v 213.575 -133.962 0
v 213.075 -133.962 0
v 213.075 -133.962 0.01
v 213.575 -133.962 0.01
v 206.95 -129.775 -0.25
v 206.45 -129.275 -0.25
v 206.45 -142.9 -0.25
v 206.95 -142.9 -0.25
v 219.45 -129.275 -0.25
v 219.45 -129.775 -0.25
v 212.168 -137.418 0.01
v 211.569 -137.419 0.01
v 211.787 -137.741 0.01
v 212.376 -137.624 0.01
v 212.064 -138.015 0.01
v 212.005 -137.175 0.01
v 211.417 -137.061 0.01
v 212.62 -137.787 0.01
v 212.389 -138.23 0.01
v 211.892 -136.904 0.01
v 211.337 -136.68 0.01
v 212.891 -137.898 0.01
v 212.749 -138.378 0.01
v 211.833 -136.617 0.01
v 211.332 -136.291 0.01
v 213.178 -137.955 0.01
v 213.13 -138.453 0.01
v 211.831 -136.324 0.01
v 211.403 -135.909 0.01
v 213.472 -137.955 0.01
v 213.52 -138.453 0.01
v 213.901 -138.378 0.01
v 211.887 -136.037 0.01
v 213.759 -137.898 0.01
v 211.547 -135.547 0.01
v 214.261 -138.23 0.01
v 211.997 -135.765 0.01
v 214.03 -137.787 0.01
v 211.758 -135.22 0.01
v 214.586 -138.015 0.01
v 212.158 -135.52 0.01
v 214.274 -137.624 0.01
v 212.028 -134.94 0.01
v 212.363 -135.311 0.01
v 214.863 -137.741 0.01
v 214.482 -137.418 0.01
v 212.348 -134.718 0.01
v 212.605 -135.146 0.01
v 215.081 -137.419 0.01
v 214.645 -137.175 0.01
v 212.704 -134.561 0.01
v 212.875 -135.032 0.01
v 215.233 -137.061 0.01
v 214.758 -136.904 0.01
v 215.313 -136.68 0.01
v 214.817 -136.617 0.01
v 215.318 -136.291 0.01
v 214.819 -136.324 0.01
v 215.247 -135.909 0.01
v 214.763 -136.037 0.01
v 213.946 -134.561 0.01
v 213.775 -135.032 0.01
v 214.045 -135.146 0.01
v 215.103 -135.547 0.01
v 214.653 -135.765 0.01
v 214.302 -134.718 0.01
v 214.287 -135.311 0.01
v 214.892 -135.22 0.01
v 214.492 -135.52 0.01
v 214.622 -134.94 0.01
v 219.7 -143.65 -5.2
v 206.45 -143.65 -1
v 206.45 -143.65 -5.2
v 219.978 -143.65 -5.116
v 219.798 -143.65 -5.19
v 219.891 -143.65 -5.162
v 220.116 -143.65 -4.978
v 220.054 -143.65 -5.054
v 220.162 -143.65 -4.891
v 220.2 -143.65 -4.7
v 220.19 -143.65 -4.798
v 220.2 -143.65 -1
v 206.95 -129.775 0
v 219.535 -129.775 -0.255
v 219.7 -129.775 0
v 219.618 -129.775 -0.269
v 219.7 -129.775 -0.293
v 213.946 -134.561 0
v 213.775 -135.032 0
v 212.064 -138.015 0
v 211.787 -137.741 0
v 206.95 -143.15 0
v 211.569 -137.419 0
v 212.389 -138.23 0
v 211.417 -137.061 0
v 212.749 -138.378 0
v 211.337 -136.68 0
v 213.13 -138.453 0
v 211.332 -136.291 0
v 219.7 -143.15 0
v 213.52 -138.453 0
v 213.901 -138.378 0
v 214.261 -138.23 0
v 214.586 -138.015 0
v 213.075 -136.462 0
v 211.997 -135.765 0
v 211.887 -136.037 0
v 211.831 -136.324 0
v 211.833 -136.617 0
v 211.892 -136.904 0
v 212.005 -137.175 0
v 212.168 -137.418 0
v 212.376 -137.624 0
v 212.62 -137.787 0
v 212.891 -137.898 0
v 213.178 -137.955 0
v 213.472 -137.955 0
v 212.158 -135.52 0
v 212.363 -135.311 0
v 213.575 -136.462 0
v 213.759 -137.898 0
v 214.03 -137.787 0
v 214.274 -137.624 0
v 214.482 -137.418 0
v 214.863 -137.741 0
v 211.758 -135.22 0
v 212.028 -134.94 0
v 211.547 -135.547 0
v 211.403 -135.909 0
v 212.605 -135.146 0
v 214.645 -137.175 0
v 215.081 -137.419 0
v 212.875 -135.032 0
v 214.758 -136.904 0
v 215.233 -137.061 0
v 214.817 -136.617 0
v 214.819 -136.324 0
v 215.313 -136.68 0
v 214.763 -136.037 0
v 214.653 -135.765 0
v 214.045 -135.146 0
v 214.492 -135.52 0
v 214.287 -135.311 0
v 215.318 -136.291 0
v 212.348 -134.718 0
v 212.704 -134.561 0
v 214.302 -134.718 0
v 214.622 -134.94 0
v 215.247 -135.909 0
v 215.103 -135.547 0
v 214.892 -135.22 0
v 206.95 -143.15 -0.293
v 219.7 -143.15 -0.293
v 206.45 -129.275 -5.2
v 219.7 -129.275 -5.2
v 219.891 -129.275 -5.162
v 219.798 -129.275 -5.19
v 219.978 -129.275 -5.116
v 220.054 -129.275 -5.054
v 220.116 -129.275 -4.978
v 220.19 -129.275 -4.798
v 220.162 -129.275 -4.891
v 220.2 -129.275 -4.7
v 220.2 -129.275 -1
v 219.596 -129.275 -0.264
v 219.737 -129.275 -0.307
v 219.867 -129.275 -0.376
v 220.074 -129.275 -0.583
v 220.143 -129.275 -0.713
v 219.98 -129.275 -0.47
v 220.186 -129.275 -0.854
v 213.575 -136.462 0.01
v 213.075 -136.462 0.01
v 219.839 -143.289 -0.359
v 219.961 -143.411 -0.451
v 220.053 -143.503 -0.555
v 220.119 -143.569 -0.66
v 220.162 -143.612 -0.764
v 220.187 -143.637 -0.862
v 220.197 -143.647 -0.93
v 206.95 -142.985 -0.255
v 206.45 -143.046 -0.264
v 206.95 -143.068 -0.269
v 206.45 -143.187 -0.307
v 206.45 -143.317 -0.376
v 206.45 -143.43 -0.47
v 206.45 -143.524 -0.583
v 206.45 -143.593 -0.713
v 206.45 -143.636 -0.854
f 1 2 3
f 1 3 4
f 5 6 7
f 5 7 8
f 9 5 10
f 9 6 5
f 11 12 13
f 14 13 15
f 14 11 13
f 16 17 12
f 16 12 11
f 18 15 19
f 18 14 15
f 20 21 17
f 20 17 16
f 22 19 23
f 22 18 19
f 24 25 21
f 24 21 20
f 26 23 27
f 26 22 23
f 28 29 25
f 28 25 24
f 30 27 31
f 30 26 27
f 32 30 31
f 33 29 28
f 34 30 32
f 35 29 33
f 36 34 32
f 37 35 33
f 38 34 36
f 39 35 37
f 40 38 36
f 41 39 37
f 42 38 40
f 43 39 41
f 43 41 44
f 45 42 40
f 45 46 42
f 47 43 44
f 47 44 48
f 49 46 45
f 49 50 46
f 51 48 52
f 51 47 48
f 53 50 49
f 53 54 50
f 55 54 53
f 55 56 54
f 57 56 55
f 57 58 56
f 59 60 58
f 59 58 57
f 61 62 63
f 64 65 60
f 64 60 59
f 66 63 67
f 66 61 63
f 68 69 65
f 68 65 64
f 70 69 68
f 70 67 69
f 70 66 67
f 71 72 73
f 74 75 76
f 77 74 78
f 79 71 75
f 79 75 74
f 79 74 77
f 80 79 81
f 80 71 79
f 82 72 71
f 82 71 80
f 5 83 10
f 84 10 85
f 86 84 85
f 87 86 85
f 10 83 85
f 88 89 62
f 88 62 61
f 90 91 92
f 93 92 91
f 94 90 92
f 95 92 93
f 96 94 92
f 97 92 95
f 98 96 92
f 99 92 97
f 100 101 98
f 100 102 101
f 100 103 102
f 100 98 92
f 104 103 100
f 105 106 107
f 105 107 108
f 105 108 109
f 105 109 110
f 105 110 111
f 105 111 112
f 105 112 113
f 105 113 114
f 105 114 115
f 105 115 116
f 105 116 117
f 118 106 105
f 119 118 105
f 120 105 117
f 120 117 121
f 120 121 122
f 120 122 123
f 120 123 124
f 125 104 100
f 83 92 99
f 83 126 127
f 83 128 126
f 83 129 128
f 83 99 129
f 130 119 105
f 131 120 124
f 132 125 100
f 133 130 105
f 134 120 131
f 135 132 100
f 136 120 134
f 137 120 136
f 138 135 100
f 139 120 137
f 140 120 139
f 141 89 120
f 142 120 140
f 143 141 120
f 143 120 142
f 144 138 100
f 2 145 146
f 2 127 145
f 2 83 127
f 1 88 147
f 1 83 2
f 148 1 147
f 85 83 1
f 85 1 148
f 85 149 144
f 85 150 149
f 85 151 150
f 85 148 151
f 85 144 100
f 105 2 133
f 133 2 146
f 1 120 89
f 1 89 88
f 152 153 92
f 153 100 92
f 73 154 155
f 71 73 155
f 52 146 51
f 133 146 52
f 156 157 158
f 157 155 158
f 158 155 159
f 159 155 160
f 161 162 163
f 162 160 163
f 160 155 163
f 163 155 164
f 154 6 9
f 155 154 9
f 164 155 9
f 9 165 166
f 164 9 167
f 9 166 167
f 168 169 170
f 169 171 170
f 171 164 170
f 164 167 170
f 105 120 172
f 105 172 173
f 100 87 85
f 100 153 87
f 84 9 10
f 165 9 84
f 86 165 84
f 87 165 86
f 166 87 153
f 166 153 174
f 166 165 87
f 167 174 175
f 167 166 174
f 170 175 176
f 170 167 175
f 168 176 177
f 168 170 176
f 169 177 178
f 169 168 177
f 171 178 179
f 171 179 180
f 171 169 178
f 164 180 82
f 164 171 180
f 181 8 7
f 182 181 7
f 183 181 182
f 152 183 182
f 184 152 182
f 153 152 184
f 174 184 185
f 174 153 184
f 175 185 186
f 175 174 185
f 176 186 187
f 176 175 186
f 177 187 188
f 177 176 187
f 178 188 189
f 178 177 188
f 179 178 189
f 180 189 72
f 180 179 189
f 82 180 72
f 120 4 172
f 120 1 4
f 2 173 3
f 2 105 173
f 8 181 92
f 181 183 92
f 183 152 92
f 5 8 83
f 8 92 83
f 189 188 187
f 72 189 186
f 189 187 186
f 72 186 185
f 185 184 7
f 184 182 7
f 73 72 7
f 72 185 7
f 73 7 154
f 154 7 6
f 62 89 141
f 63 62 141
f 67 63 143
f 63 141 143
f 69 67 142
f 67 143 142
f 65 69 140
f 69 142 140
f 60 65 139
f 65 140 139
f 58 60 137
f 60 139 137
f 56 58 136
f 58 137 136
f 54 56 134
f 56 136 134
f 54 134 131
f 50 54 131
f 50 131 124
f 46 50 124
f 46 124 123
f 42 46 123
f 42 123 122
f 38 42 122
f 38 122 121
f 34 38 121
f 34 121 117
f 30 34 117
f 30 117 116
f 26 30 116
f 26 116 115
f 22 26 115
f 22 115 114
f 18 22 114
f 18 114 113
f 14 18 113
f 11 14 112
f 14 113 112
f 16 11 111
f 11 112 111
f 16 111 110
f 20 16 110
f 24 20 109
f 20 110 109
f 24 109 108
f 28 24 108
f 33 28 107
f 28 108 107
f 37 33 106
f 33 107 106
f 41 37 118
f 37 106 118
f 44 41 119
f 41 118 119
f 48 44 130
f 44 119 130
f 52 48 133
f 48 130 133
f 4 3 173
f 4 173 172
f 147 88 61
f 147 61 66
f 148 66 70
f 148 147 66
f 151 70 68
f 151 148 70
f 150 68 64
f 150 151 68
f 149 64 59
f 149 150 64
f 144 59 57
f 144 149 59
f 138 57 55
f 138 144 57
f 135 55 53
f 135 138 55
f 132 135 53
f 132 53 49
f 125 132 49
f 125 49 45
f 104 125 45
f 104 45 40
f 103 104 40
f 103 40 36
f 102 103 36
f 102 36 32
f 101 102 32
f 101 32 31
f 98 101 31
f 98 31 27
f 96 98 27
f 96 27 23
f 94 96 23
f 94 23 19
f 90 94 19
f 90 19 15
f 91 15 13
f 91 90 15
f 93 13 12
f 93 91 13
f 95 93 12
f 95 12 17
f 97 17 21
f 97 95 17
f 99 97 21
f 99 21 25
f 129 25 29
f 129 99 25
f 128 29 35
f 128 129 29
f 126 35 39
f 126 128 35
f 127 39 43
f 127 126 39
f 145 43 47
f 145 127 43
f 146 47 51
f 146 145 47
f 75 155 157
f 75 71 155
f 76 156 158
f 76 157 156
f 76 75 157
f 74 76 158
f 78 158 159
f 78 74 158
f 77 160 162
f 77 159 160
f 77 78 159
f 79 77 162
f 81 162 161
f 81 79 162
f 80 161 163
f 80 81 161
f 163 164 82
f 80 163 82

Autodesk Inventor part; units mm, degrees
ref_plane "YZ Plane" through (0, 0, 0) normal (1, 0, 0) x (0, 1, 0)
ref_plane "XZ Plane" through (0, 0, 0) normal (0, 1, 0) x (-1, 0, 0)
ref_plane "XY Plane" through (0, 0, 0) normal (0, 0, 1) x (1, 0, 0)
sketch "Szkic1" plane through (0, 0, 0) normal (0, 0, 1) x (1, 0, 0)
  line L0 (206.45, -143.65) -> (206.45, -129.275)
  line L1 (206.45, -129.275) -> (220.2, -129.275)
  line L2 (206.45, -143.65) -> (220.2, -143.65)
  line L3 (220.2, -129.275) -> (220.2, -143.65)
extrude "Wyciągnięcie proste1" add sketch "Szkic1" against normal blind 5.2
fillet "Zaokrąglenie1" radius 0.5 1 edges at (220.2, -136.4625, -5.2)
sketch "Szkic2" plane through (0, 0, 0) normal (0, 0, 1) x (1, 0, 0)
  line L0 (206.95, -129.775) -> (219.7, -129.775)
  line L1 (219.7, -129.775) -> (219.7, -143.15)
  line L2 (219.7, -143.15) -> (206.95, -143.15)
  line L3 (206.95, -143.15) -> (206.95, -129.775)
  line L4 (206.45, -129.275) -> (220.2, -129.275) projected
  line L5 (220.2, -129.275) -> (220.2, -143.65) projected
  line L6 (206.45, -129.275) -> (220.2, -129.275)
  line L7 (220.2, -129.275) -> (220.2, -143.65)
  line L8 (220.2, -143.65) -> (206.45, -143.65)
  line L9 (206.45, -143.65) -> (206.45, -129.275)
  point P0 (0, 0)
extrude "Wyciągnięcie proste2" cut sketch "Szkic2" against normal blind 0.25
sketch "Szkic3" plane through (0, 0, 0) normal (0, 0, 1) x (1, 0, 0)
  line L0 (213.075, -133.9625) -> (213.575, -133.9625)
  line L1 (213.575, -133.9625) -> (213.575, -136.4625)
  line L2 (213.575, -136.4625) -> (213.075, -136.4625)
  line L3 (213.075, -136.4625) -> (213.075, -133.9625)
  line L4 (212.875, -134.9835) -> (212.875, -135.0316)
  line L5 (212.875, -135.0316) -> (212.7039, -134.5614)
  line L6 (213.775, -135.0316) -> (213.9461, -134.5614)
  arc A0 (212.7039, -134.5614) -> (213.9461, -134.5614) centre (213.325, -136.4625) ccw
  arc A1 (212.875, -135.0316) -> (213.775, -135.0316) centre (213.325, -136.4625) ccw
  point P0 (0, 0)
extrude "Wyciągnięcie proste3" cut sketch "Szkic3" against normal blind 0.5
sketch "Szkic4" plane through (0, 0, -0.5) normal (0, 0, 1) x (1, 0, 0)
  line L0 (213.075, -133.9625) -> (213.575, -133.9625) projected
  line L1 (213.075, -136.4625) -> (213.075, -133.9625) projected
  line L2 (213.575, -136.4625) -> (213.075, -136.4625) projected
  line L3 (213.575, -133.9625) -> (213.575, -136.4625) projected
  line L4 (212.7039, -134.5614) -> (212.875, -135.0316) projected
  arc A0 (212.7039, -134.5614) -> (213.9461, -134.5614) centre (213.325, -136.4625) ccw projected
  line L5 (213.775, -135.0316) -> (213.9461, -134.5614) projected
  arc A1 (212.875, -135.0316) -> (213.775, -135.0316) centre (213.325, -136.4625) ccw projected
  point P0 (0, 0)
extrude "Wyciągnięcie proste4" add sketch "Szkic4" along normal blind 0.51
fillet "Zaokrąglenie2" radius 0.75 2 edges at (220.2, -136.4625, -0.25) (213.325, -143.65, -0.25)
properties part number "PRZYCISK IO" material "Tworzywo sztuczne, nieprzezroczyste czarne"
